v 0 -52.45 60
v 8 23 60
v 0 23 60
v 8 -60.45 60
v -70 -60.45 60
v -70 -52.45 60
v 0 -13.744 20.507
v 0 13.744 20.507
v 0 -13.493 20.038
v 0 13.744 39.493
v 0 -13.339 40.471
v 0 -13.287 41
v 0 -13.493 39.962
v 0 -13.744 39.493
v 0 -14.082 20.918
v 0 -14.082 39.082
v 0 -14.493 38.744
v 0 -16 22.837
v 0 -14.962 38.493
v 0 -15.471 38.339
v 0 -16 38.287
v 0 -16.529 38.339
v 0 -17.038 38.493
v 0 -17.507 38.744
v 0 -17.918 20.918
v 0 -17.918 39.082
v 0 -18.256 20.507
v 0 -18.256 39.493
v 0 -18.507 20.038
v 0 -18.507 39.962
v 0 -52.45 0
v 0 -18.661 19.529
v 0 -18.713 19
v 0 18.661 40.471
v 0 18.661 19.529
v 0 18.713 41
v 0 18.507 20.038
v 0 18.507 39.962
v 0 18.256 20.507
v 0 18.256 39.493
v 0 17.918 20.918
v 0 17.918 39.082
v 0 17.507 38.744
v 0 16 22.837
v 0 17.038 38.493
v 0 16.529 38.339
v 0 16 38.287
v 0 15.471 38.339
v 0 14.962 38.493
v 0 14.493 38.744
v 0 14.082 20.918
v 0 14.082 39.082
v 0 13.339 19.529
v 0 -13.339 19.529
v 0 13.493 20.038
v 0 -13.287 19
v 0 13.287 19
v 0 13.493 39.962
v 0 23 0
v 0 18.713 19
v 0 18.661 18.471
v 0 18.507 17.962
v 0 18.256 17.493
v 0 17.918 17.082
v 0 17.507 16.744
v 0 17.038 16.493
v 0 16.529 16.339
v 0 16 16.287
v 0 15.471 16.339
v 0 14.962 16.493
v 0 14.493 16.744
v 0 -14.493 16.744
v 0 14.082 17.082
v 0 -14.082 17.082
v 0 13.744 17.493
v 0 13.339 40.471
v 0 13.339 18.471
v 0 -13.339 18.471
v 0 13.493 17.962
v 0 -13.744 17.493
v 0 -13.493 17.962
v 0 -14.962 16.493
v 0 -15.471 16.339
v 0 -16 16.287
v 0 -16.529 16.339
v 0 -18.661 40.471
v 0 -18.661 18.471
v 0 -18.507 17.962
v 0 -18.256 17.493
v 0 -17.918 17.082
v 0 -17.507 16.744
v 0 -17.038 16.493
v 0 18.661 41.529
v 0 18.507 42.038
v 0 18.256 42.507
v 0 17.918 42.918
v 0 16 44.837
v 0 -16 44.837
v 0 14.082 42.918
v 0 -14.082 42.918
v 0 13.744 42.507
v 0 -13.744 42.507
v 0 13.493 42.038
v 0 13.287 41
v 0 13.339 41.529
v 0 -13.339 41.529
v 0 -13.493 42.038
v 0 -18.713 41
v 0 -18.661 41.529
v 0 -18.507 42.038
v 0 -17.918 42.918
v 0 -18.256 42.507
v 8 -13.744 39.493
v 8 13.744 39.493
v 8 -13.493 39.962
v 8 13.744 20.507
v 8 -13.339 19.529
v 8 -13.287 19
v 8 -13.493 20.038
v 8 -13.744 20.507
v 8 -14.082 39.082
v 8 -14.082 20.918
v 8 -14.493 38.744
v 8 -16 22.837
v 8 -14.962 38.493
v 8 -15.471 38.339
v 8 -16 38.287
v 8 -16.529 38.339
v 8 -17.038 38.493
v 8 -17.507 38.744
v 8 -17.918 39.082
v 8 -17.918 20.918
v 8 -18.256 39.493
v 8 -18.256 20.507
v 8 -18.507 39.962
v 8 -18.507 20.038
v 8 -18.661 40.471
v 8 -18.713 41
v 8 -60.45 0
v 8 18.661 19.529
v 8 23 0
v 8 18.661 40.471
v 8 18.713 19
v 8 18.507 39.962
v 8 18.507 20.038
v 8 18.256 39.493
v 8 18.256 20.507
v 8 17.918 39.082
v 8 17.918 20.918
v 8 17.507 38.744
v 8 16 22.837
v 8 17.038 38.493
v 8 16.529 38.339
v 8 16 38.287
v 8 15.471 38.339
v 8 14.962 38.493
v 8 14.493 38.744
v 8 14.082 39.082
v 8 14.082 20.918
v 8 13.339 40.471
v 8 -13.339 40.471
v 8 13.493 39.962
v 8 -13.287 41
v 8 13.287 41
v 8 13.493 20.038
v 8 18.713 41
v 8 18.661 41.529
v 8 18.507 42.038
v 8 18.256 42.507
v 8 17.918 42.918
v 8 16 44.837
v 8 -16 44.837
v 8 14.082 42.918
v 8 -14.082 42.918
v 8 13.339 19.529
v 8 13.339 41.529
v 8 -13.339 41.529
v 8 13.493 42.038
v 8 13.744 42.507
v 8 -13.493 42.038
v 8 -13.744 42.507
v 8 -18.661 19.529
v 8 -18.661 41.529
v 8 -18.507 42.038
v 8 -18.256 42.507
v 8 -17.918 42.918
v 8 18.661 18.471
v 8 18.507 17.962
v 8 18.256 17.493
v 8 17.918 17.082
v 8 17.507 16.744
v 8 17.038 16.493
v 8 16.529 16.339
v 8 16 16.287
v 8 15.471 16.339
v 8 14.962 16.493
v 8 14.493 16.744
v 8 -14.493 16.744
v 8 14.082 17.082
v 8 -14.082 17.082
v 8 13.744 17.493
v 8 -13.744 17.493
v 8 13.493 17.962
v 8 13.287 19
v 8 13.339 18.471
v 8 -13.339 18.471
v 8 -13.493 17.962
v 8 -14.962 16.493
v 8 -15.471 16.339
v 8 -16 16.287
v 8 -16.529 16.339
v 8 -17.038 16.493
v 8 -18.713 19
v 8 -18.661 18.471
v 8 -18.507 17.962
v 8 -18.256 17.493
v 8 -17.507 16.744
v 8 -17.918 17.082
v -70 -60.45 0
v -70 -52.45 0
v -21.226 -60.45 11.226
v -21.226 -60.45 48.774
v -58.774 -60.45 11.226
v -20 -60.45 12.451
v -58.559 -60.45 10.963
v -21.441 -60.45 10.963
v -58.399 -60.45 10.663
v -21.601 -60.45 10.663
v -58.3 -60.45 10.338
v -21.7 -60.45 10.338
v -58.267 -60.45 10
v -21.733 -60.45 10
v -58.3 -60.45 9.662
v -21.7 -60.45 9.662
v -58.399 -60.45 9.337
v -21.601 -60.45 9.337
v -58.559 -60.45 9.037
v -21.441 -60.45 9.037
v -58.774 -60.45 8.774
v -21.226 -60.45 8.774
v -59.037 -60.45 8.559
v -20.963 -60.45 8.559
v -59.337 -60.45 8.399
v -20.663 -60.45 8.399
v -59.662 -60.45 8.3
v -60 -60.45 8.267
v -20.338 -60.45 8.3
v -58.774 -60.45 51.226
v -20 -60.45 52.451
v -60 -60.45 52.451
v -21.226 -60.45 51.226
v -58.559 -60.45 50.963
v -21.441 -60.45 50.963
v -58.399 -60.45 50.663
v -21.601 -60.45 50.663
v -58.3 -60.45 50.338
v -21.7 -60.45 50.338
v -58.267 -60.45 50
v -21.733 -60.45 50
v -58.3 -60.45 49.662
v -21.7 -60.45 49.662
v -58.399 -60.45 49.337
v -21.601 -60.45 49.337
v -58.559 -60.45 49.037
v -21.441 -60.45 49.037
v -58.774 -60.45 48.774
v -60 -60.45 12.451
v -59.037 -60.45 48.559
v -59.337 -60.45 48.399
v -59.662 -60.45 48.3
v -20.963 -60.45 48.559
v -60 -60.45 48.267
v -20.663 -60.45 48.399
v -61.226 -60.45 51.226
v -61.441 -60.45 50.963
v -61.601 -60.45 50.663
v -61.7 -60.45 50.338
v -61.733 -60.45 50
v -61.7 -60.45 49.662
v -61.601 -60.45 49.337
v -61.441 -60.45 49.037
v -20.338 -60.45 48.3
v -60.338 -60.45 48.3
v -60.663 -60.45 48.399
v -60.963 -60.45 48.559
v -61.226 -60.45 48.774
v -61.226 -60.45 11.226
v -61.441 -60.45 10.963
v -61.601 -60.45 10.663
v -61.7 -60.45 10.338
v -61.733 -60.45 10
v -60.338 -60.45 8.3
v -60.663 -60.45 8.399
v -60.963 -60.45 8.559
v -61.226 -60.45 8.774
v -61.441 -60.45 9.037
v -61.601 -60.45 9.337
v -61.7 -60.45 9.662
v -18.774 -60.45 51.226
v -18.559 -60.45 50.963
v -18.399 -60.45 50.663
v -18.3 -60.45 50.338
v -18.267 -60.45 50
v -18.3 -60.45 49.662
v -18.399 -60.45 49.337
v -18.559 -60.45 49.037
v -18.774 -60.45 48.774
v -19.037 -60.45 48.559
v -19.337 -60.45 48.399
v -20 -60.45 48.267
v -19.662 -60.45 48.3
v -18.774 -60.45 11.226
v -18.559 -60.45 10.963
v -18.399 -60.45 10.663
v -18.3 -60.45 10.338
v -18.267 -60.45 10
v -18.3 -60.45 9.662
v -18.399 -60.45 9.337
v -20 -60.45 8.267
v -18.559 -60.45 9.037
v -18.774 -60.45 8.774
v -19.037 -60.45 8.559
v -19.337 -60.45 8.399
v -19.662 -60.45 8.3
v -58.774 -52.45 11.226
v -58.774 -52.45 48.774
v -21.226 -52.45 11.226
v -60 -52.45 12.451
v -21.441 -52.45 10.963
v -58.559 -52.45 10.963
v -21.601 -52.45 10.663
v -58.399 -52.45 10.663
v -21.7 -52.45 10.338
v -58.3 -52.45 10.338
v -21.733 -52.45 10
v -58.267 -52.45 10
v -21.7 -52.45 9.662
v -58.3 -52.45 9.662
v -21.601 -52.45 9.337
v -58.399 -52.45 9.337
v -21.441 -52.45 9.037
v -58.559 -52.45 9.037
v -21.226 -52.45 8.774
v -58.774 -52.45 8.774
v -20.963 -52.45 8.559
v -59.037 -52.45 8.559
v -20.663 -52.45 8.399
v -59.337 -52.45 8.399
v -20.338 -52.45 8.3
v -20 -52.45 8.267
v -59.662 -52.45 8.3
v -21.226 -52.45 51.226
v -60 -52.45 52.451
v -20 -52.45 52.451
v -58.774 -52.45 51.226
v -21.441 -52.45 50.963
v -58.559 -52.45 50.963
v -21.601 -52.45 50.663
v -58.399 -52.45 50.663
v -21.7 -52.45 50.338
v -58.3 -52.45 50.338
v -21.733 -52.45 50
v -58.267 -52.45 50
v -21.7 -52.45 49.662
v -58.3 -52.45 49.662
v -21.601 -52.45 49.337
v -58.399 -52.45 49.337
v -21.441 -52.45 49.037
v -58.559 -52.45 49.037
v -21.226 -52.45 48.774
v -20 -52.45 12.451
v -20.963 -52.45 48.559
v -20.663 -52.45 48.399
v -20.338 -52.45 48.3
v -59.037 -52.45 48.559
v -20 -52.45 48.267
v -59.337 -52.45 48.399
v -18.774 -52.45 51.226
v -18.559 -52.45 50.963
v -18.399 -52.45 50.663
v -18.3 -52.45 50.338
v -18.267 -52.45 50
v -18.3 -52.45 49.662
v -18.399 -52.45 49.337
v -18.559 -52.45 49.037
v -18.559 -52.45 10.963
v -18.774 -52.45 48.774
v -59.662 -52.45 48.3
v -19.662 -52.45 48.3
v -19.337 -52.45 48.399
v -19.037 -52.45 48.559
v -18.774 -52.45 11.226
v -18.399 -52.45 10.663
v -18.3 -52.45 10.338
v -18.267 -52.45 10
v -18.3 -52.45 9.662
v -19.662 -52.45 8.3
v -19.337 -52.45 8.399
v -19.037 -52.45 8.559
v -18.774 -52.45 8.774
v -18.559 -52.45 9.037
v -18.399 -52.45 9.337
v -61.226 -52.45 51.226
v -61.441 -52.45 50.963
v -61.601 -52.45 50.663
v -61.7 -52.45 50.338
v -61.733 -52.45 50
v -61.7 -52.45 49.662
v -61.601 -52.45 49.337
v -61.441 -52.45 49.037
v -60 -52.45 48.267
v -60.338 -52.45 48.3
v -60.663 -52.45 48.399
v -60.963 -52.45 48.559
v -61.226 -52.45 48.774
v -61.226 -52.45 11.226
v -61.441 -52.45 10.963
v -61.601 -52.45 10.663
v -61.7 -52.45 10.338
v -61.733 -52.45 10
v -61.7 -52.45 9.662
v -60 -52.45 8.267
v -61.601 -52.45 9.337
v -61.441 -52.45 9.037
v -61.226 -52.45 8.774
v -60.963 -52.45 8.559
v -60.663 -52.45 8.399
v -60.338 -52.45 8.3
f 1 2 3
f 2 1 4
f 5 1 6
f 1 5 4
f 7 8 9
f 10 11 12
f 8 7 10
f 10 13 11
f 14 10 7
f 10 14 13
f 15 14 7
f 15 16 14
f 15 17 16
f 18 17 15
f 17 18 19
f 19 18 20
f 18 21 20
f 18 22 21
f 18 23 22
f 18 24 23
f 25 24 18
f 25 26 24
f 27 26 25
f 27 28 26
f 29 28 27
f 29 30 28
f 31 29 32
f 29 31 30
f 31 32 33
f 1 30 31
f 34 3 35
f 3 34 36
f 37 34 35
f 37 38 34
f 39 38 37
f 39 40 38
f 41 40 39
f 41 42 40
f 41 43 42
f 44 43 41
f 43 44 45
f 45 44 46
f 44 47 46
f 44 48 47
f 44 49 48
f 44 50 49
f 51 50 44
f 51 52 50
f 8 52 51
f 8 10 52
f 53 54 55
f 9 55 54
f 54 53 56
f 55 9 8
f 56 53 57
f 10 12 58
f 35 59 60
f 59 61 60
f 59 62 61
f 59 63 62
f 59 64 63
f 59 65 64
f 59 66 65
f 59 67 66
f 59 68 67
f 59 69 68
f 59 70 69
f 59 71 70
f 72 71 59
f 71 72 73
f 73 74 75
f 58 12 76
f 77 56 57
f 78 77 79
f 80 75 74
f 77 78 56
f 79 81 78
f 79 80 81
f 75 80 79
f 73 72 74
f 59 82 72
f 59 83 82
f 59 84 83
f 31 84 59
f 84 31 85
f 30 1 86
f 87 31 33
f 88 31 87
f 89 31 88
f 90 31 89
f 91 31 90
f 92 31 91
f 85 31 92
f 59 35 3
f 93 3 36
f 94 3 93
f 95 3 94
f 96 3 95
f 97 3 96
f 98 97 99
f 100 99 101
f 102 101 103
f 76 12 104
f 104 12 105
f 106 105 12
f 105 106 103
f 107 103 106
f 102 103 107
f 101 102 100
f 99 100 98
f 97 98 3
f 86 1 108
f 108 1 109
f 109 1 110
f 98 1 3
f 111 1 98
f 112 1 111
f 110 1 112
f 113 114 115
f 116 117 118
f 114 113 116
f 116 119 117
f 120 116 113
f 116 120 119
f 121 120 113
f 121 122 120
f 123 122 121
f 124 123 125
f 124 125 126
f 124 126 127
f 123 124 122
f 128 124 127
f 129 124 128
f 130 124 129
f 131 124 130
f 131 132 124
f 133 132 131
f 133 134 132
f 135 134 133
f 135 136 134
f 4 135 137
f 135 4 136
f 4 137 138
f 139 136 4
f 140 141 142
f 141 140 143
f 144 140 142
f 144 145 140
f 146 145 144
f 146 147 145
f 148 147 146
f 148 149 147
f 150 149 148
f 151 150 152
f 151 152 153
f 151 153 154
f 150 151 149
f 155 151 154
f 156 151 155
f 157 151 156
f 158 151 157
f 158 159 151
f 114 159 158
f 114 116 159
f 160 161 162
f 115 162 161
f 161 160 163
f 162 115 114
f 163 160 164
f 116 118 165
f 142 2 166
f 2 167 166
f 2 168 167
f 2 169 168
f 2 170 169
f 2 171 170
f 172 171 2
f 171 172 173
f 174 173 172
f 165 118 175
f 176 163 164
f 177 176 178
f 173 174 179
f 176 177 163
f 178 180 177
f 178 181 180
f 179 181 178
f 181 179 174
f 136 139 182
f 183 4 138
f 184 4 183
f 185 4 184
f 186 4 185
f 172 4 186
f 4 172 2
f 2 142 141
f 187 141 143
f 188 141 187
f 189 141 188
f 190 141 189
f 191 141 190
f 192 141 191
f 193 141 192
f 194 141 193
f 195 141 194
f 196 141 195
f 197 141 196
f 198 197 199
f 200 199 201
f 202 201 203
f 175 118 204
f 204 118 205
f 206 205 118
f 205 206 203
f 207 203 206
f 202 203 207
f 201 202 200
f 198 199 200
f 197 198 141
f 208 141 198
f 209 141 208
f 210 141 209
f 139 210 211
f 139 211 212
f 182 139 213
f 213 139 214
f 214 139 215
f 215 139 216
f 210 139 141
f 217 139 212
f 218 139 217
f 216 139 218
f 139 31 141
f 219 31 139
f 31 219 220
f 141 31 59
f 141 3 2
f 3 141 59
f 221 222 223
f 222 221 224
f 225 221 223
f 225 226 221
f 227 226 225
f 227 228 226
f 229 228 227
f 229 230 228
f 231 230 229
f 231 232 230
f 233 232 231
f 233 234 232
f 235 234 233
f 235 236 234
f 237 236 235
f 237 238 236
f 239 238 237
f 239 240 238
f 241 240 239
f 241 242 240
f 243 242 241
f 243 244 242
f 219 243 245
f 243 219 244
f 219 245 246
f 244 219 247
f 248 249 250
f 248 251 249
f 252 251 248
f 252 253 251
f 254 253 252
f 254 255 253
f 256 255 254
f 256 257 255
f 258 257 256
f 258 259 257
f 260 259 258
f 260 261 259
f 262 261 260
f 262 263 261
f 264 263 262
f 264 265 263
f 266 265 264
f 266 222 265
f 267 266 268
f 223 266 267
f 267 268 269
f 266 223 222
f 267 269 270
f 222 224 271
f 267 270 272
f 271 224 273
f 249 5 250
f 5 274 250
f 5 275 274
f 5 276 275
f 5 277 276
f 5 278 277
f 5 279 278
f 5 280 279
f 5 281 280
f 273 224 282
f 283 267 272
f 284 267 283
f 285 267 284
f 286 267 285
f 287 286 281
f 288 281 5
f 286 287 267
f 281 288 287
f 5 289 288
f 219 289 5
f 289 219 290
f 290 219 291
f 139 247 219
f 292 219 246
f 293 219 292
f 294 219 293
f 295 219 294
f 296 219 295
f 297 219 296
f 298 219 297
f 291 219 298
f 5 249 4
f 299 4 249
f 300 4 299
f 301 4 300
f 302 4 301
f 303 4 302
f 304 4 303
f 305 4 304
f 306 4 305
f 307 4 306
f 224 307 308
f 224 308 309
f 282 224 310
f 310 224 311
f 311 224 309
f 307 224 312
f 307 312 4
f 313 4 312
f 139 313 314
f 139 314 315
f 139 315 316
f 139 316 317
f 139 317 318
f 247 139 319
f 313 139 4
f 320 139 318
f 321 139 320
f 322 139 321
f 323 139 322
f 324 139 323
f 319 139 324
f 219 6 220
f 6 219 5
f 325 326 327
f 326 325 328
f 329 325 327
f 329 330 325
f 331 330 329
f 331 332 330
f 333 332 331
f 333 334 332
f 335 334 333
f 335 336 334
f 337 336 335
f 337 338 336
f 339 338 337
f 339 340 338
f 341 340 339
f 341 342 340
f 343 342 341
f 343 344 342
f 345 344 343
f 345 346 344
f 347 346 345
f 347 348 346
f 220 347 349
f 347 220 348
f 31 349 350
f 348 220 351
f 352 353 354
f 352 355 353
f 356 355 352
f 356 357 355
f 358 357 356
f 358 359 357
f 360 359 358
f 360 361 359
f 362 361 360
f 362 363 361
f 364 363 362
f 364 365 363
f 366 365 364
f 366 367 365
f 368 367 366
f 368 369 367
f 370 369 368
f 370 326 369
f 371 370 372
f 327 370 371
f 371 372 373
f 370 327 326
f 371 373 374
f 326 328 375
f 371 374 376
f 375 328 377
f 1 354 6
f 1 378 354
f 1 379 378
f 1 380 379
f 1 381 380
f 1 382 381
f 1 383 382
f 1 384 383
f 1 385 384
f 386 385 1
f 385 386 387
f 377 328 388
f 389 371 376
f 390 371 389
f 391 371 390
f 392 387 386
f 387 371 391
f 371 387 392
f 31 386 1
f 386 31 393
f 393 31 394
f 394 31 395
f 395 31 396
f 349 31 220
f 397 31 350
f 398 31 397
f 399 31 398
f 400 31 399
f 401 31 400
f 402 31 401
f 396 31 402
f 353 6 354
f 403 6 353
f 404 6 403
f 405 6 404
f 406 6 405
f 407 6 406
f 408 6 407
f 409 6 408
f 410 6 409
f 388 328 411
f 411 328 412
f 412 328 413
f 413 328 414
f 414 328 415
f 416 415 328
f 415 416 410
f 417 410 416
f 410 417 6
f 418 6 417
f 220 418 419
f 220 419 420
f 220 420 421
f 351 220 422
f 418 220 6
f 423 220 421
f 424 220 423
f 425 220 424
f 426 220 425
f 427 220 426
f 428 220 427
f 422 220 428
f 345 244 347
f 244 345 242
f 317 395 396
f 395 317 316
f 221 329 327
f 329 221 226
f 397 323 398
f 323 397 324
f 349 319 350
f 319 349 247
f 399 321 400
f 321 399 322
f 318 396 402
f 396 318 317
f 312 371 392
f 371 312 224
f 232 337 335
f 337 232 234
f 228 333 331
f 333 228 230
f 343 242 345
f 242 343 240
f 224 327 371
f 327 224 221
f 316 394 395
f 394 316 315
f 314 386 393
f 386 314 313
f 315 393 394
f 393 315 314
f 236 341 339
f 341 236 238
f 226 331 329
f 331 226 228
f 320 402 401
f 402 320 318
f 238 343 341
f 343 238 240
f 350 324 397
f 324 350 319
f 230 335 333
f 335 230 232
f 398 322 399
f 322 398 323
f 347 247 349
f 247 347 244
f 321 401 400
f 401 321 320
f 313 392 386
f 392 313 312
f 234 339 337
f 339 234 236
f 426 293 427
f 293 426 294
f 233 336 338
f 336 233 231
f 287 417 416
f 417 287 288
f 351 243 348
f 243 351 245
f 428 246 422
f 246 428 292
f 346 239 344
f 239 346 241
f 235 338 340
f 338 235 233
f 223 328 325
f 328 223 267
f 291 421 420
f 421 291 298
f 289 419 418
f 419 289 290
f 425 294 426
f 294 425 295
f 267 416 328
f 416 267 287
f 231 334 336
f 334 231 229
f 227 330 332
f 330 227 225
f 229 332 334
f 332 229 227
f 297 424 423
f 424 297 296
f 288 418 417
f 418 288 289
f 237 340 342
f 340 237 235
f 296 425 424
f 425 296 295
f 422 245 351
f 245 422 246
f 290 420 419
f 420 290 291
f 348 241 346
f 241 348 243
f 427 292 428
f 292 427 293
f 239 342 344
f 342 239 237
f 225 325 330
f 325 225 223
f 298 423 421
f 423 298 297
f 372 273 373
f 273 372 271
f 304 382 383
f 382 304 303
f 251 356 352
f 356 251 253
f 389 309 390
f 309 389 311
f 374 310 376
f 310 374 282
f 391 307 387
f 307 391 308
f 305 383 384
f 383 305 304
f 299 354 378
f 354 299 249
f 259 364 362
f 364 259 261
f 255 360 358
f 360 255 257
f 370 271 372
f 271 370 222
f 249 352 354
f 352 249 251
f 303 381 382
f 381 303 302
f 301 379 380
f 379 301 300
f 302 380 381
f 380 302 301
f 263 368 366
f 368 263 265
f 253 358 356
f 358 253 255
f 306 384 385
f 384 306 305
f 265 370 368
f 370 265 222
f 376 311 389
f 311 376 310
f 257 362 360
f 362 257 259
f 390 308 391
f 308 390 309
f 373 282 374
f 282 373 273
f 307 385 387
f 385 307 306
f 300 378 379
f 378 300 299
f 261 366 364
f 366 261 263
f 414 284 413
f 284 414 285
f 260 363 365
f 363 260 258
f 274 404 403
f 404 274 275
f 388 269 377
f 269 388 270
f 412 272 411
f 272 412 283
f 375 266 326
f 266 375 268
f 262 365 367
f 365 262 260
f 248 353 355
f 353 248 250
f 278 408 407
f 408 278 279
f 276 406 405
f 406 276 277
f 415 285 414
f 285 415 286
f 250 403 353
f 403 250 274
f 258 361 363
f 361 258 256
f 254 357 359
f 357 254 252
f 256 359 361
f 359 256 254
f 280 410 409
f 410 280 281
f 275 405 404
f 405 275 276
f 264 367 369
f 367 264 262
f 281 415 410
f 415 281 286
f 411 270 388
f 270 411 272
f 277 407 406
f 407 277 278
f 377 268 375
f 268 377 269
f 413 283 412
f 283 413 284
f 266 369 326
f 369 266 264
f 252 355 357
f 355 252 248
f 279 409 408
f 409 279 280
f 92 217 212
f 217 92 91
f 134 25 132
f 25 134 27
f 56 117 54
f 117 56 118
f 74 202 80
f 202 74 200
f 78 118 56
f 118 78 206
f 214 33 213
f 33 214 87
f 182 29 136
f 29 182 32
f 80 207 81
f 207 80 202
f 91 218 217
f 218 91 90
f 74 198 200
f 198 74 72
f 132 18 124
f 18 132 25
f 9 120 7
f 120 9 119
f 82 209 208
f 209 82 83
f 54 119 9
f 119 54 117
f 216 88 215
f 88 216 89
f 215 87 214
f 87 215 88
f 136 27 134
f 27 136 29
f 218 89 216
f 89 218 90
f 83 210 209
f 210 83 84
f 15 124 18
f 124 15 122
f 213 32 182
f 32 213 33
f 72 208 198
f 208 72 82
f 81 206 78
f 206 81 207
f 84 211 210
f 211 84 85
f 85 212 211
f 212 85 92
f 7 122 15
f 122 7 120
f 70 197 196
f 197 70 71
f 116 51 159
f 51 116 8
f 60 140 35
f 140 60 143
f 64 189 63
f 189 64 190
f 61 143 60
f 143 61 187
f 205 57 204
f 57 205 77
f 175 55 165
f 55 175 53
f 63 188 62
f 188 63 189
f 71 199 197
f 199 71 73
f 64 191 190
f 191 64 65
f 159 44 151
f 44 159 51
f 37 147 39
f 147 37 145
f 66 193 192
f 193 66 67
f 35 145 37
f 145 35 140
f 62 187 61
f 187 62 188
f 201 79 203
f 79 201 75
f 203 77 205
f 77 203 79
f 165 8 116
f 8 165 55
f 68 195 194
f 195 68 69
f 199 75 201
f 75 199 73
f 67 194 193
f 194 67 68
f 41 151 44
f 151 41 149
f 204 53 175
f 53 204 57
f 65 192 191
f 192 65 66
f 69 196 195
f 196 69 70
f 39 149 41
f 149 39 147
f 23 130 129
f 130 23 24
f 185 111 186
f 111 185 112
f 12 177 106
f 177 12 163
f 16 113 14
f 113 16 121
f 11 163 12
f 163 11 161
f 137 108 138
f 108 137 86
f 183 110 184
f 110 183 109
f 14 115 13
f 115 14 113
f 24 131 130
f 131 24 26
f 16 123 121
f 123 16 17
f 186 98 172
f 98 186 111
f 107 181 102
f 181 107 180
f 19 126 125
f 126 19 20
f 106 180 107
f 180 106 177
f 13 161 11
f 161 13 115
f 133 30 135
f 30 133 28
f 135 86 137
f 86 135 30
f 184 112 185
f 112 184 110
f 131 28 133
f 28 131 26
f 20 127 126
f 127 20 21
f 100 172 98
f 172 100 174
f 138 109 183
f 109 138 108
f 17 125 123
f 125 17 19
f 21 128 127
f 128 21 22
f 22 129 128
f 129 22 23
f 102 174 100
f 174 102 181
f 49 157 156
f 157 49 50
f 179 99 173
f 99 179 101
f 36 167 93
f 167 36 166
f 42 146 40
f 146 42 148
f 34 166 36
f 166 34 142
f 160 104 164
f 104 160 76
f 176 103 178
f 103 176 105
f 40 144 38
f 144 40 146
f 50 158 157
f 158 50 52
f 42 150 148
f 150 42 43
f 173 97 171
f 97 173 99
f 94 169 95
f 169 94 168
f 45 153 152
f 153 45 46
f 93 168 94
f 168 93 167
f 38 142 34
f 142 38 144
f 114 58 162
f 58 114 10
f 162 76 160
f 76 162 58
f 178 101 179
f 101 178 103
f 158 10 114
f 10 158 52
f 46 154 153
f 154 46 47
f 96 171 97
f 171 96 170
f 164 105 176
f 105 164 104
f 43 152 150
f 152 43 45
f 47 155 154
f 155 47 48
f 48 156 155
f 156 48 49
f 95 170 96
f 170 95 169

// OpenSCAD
// CHILD-SIMPLE-M3-40x40 Rev.1 -> existing 22 x 32 M5 camera base.
// Assembly coordinates match camera_mount.scad. Print with +X up.
part="print"; // [print,assembly]
width=60; thickness=8;
rear_y=-60.45; shelf_front=23;
pad_center_z=40; pitch=40; pad_height=60;
m3_d=3.45; m5_d=5.4;
$fn=64; eps=0.02;
assert(width/2-pitch/2>m3_d/2+4);
assert(pad_center_z-pitch/2-5>8,"Bottom M3 tool clears camera base");
// All horizontal bores get a 45 degree roof facing +X (print up).
module roof2d(d) {
 r=d/2/cos(180/32);
 polygon(concat([for(a=[135:11.25:405]) [r*cos(a),r*sin(a)]],[[0,r*sqrt(2)]]));
}
module bore_y(x,y,z,d,h) {
 translate([x,y,z]) multmatrix([[0,1,0,0],[0,0,1,0],[1,0,0,0],[0,0,0,1]]) linear_extrude(h) roof2d(d);
}
module bore_z(x,y,z,d,h) {
 translate([x,y,z]) rotate([0,0,-90]) linear_extrude(h) roof2d(d);
}
module adapter() {
 difference() {
  union() {
   translate([-width/2,rear_y,-thickness]) cube([width,shelf_front-rear_y,thickness]);
   translate([-width/2,rear_y,0]) cube([width,thickness,pad_center_z+pad_height/2]);
  }
  for(x=[-pitch/2,pitch/2],z=[pad_center_z-pitch/2,pad_center_z+pitch/2])
   bore_y(x,rear_y-eps,z,m3_d,thickness+2*eps);
  for(x=[-11,11],y=[-16,16]) bore_z(x,y,-thickness-eps,m5_d,thickness+2*eps);
 }
}
if(part=="assembly") adapter();
else translate([0,0,width/2]) rotate([0,-90,0]) adapter();
